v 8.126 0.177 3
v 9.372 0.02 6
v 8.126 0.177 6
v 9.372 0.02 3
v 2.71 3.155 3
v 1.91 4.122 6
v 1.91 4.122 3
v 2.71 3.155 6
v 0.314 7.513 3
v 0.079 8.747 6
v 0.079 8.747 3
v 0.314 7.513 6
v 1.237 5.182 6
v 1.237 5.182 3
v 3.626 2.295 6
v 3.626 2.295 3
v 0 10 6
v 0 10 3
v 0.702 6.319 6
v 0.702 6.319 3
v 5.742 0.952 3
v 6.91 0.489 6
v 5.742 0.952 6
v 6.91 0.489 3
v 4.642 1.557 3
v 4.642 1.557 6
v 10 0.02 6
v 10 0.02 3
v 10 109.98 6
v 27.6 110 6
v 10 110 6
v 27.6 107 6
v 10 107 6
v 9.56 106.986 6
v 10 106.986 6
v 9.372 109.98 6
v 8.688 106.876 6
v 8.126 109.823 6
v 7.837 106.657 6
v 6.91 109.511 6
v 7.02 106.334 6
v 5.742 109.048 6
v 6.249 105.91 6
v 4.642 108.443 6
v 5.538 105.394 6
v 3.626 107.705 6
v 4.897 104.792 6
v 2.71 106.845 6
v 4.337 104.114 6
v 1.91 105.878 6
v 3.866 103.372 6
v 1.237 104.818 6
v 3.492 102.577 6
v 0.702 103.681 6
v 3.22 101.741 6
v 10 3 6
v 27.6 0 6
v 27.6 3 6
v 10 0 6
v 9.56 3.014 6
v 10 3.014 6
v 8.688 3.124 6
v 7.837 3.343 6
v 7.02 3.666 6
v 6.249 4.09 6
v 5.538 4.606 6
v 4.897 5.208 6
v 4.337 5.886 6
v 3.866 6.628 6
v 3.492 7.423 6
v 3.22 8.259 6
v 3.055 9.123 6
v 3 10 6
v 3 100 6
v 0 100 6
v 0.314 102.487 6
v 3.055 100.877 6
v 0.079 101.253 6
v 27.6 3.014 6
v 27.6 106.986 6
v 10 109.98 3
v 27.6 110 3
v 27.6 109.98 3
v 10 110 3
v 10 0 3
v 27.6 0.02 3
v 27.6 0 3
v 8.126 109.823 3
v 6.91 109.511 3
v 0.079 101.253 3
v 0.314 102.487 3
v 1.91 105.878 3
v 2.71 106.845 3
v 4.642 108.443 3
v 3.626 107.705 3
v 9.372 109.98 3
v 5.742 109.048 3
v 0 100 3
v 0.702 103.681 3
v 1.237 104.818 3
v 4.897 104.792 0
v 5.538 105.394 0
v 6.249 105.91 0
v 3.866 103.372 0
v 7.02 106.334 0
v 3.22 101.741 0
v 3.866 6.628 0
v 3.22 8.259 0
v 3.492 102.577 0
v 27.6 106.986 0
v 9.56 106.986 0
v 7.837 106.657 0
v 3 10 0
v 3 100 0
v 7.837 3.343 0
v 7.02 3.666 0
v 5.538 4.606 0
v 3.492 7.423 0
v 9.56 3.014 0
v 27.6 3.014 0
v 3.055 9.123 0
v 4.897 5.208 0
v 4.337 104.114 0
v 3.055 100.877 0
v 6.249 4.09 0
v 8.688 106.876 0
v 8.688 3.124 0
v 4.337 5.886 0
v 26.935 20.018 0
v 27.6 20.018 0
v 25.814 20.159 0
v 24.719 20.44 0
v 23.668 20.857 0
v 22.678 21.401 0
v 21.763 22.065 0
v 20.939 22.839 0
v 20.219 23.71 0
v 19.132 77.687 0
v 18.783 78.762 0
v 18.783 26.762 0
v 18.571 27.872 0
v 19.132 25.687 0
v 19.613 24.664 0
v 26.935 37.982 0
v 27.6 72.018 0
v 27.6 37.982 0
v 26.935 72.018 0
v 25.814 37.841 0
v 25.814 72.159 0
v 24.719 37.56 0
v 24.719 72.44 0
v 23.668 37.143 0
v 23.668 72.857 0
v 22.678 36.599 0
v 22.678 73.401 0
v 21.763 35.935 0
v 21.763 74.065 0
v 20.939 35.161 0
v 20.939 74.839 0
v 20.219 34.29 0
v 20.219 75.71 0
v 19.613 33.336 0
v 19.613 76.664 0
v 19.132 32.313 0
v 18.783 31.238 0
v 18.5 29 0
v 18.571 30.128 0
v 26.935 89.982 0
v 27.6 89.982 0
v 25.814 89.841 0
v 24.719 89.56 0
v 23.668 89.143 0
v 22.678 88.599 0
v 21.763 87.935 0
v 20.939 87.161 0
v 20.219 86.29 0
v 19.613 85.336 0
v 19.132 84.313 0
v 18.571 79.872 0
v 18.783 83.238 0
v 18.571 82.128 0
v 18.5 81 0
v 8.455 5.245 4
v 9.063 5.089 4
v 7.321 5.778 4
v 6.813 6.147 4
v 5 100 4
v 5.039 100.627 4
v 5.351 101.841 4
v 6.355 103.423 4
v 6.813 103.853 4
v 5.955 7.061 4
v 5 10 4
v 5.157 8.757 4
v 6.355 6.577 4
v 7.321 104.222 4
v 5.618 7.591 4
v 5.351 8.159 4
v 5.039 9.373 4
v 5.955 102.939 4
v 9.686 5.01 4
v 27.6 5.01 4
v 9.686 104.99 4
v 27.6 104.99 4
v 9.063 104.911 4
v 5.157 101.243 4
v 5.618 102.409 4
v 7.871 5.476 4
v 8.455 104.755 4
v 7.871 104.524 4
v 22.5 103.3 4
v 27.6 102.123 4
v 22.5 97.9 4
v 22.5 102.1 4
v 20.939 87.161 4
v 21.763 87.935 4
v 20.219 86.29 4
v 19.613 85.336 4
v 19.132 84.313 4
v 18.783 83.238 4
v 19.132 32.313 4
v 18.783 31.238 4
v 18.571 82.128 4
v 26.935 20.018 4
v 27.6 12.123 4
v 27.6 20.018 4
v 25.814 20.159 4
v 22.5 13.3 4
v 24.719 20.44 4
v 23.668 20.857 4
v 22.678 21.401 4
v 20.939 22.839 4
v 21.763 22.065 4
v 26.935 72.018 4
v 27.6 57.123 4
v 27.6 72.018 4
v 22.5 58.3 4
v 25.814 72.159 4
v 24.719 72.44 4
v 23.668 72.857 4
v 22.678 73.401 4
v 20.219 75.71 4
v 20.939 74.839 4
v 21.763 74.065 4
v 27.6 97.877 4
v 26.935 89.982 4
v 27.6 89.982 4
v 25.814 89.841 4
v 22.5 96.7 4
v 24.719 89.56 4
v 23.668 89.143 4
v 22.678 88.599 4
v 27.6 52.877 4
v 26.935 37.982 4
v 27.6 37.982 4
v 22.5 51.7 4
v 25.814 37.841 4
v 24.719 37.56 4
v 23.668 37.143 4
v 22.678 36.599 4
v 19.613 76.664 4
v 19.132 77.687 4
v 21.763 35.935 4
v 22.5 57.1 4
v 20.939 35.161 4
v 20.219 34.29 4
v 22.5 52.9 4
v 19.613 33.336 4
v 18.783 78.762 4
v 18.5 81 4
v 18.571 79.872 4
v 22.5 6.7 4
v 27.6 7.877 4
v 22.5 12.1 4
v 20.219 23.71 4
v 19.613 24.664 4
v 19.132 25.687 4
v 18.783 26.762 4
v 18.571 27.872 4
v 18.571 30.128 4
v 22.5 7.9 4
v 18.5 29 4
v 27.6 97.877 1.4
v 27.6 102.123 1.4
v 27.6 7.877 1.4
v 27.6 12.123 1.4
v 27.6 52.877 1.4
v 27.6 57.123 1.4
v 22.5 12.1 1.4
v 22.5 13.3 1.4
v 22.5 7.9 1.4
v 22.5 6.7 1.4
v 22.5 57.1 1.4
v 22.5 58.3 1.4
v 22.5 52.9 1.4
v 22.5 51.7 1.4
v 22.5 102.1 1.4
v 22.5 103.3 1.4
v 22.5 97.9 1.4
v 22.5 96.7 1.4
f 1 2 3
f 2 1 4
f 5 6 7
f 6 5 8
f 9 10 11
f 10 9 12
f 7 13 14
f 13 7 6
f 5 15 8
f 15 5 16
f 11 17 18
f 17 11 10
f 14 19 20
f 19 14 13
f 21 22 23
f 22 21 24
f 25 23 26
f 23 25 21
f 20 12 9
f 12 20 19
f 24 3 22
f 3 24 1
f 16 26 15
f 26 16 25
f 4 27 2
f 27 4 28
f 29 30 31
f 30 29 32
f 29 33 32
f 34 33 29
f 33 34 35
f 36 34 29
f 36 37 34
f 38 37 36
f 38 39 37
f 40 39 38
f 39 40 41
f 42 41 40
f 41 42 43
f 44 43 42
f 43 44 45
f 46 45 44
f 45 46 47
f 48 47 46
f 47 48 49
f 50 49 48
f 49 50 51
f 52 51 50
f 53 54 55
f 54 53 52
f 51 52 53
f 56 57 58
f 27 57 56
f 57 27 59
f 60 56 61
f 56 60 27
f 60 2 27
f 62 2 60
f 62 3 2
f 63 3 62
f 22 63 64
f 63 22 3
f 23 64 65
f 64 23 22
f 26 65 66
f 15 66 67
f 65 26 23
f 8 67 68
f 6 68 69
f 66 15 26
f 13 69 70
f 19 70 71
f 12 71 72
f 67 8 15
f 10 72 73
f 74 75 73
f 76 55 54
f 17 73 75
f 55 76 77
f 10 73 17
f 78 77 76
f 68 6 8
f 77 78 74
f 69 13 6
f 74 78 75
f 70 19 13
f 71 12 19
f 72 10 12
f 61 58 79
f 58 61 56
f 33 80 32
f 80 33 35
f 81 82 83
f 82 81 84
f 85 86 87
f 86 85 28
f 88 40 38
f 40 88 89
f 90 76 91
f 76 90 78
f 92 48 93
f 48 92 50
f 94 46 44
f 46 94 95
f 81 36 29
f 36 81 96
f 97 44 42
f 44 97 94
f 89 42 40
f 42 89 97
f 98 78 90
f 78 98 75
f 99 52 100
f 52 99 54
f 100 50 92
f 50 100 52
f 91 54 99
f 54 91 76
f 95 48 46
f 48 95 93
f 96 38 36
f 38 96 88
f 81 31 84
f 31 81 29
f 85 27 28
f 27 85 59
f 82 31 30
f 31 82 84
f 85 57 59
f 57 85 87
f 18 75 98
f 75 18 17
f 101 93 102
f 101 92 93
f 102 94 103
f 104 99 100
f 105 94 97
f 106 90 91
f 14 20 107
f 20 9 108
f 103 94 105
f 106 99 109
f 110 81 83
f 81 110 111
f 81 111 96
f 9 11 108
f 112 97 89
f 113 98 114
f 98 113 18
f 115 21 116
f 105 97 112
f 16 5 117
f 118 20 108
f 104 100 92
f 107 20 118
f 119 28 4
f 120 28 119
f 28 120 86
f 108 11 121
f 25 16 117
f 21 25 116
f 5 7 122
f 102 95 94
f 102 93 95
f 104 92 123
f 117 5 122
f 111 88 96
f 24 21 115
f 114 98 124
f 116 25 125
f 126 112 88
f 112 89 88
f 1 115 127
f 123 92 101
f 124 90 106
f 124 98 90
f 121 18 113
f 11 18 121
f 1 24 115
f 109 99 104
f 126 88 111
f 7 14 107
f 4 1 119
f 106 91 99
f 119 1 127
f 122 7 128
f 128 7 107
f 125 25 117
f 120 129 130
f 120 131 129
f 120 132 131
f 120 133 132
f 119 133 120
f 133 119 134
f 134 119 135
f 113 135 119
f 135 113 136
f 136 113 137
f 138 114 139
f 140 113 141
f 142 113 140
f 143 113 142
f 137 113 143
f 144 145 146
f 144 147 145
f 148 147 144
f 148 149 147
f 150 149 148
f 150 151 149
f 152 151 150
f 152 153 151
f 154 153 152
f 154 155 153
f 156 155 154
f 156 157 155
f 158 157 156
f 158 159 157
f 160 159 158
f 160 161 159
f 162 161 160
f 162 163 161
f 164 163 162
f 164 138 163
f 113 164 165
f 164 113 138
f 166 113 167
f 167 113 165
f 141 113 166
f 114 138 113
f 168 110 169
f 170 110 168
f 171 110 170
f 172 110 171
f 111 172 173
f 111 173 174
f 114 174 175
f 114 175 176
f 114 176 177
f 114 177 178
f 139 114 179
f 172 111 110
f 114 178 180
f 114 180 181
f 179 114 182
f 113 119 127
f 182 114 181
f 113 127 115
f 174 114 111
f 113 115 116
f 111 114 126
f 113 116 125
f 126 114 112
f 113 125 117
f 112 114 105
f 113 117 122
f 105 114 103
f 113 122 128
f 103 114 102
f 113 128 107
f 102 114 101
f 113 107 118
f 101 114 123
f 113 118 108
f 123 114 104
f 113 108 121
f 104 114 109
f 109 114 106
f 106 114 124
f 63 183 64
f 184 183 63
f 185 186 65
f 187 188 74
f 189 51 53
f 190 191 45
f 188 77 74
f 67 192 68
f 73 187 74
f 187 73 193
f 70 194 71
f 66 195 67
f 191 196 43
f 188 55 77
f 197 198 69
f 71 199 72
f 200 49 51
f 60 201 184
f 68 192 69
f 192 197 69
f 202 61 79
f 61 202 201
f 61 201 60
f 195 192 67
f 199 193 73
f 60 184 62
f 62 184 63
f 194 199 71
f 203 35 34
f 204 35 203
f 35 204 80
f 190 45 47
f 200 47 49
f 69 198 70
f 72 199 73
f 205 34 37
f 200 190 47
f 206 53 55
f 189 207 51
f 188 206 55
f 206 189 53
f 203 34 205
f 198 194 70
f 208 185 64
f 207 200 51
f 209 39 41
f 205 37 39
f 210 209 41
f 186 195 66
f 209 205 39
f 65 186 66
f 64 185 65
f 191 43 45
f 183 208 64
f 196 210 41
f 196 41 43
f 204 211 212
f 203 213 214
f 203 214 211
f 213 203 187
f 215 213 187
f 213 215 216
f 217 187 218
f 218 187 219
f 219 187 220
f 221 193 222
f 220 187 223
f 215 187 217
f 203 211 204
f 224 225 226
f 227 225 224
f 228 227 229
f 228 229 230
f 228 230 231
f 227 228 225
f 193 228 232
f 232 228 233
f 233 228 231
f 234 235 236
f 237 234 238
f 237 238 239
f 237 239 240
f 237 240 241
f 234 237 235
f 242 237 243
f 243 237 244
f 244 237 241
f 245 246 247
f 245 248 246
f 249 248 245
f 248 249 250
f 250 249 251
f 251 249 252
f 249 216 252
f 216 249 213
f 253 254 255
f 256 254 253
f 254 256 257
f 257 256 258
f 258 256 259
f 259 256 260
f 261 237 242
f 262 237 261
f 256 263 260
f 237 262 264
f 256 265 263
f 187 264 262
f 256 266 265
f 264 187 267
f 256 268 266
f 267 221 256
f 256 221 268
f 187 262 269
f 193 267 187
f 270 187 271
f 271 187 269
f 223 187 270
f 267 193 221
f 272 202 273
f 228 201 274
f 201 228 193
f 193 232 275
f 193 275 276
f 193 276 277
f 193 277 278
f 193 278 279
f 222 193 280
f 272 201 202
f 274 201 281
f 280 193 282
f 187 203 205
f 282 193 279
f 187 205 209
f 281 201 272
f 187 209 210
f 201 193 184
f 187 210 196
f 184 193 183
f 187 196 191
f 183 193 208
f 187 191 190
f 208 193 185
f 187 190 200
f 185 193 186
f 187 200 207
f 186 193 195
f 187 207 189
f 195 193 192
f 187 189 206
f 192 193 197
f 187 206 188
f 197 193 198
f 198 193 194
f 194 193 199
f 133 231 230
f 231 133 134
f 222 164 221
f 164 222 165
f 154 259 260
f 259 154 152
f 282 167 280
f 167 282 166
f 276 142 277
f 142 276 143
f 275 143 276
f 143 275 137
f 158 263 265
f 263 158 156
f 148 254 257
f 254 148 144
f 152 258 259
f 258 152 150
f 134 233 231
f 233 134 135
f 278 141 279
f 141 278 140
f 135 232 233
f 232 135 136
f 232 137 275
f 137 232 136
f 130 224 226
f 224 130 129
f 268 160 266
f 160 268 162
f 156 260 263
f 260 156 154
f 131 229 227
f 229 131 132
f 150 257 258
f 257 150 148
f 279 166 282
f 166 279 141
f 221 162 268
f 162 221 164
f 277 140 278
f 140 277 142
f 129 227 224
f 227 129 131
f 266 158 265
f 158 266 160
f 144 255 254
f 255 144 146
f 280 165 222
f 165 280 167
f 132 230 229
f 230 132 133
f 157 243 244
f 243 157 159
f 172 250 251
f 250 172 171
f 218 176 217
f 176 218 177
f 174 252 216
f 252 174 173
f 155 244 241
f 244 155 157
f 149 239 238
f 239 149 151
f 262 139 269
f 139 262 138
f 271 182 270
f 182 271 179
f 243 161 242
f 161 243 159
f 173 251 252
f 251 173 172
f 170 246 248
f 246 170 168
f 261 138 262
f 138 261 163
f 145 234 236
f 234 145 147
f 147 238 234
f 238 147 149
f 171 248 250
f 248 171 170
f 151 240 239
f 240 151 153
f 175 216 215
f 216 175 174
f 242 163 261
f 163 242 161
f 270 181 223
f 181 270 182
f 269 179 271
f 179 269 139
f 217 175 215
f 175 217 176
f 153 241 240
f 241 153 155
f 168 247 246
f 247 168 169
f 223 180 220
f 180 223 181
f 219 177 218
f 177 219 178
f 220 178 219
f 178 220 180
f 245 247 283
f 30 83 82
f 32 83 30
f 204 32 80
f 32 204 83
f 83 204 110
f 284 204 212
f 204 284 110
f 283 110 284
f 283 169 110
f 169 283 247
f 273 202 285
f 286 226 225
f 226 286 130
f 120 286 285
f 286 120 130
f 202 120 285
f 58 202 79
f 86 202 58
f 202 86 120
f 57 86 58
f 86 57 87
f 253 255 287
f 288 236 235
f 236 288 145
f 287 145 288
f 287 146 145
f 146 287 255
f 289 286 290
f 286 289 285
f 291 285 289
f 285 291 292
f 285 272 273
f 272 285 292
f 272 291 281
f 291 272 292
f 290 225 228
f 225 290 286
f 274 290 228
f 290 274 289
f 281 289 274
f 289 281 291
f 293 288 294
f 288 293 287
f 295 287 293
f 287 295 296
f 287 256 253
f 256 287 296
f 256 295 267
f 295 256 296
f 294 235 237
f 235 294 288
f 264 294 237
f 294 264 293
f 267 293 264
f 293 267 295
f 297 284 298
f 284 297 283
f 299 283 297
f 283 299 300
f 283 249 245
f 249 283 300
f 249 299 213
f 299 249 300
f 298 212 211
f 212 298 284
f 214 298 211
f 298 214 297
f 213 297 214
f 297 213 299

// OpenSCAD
// file: toilet_ground_floor_config.scad
use <./_cfg.scad>

// Toilet Ground Floor Configuration Functions
function get_h() = 6;
function get_width() = 55;
function get_length() = 110;
function get_diameter() = 18;
function get_distance() = 52;
function get_nutDistance() = 10;
function get_separation() = 10;
function get_offset_l() = 0;
function get_offset_r() = 0;
// file: _cfg.scad
// Global configuration functions
function get_fn() = 50;
function get_darft() = false;
// file: base.scad
module base(h, width, length, diameter, distance, offset_l=0, offset_r=0, fn) {
    corner_radius=10;

    difference() {
        union() {
            difference() {
                _base_plate_shape(corner_radius, h, width, length, fn);
                translate([3,3,h-2]) {
                    offset=3;
                    _base_plate_shape(corner_radius-offset, h-2, width-offset*2, length-offset*2, fn);
                }
            }
        }

        translate([width/2, length/2-distance/2, -.1]) {
            translate([offset_l, 0, 0])
            cylinder(d=diameter, h=h+.2, center=false, $fn=fn);
            translate([offset_r, distance, 0]) {
                cylinder(d=diameter, h=h+.2, center=false, $fn=fn);
            }
        }
    }
}

module rounded_top_only(corner_radius, h, width, length, fn) {
    minkowski() {
        _base_plate_shape(corner_radius, h - corner_radius, width, length, fn);
        translate([0, 0, corner_radius]) cylinder(r=corner_radius/2, h=0.001, $fn=fn);
    }
}

module _base_plate_shape(corner_radius, h, width, length, fn) {
    hs=h/2;
    hn=h-hs;

    translate([0, 0, hs])

    union() {
        translate([corner_radius, 0, 0])
            cube([width - corner_radius * 2, length, hn], center=false);

        translate([0, corner_radius, 0])
            cube([width, length - corner_radius * 2, hn], center=false);

        for (x = [corner_radius, width - corner_radius])
        for (y = [corner_radius, length - corner_radius])
        translate([x, y, 0])
            cylinder(d = corner_radius * 2, h = hn, center = false, $fn = fn);

        // -------

        hull() {
            for (x = [corner_radius, width - corner_radius])
            for (y = [corner_radius, length - corner_radius])
            translate([x, y, 0])
                translate([0, 0, -hs])
                    cylinder(r1=corner_radius-hs, r2=corner_radius, h = hs, center = false, $fn = fn);
        }
    }
}

module nut(h,extend=0) {
    nut_height=h;
    nut_width=5+extend;
    nut_length=4+extend;
    nut_length_=1+extend;
    rotate([0,0,90]) {
        translate([-nut_length/2,0,0]) {
            linear_extrude(height=nut_height)
                polygon(points=[[0,0], [-nut_length_,nut_width], [0,nut_width]]);

            translate([nut_length,0,0]) {
                linear_extrude(height=nut_height)
                    polygon(points=[[0,0], [nut_length_,nut_width], [0,nut_width]]);
            }

            cube([nut_length, nut_width, nut_height], center=false);
        }
    }
}

module both(h, width, length, diameter, distance, nutDistance, separation, offset_l=0, offset_r=0, fn) {
    left(h, width, length, diameter, distance, nutDistance, offset_l, offset_r, fn);

    translate([-separation, 0, 0])
        right(h, width, length, diameter, distance, nutDistance, offset_l, offset_r, fn);
}

module left(h, width, length, diameter, distance, nutDistance, offset_l=0, offset_r=0, fn) {
    union() {
        translate([0, 0, 0]) {
            difference() {
                base(h, width, length, diameter, distance, offset_l, offset_r, fn);
                translate([-.1, -.1, -.1]) {
                    cube([width / 2, length + .2, h + .2], center = false);
                }
            }
        }

        translate([0.2,0,2])
            translate([width / 2, 0, 0]) {
                translate([0, nutDistance, 0]) {
                    nut(h - 4);
                }
                translate([0, length / 2, 0]) {
                    nut(h - 4);
                }
                translate([0, length - nutDistance, 0]) {
                    nut(h - 4);
                }
            }
    }
}

module right(h, width, length, diameter, distance, nutDistance, offset_l=0, offset_r=0, fn) {
    difference() {
        union() {
            difference() {
                base(h, width, length, diameter, distance, offset_l, offset_r, fn);
                translate([width / 2 + .1, -.1, -.1]) {
                    cube([width / 2, length + .2, h + .2], center = false);
                }
            }
        }

        translate([0.2,0,1.5])
            translate([width / 2 , 0, -.1]) {
                translate([0, nutDistance, 0]) {
                    nut(h - 1.3, extend = .2);
                }
                translate([0, length / 2, 0]) {
                    nut(h - 1.3, extend = .2);
                }
                translate([0, length - nutDistance, 0]) {
                    nut(h - 1.3, extend =  .2);
                }
            }
    }
}
// main file
use <./base.scad>
use <./_cfg.scad>
use <./toilet_ground_floor_config.scad>

right(h=get_h(),
width=get_width(),
length=get_length(),
diameter=get_diameter(),
distance=get_distance(),
nutDistance=get_nutDistance(),
offset_l=get_offset_l(),
offset_r=get_offset_r(),
fn=get_fn()
);
